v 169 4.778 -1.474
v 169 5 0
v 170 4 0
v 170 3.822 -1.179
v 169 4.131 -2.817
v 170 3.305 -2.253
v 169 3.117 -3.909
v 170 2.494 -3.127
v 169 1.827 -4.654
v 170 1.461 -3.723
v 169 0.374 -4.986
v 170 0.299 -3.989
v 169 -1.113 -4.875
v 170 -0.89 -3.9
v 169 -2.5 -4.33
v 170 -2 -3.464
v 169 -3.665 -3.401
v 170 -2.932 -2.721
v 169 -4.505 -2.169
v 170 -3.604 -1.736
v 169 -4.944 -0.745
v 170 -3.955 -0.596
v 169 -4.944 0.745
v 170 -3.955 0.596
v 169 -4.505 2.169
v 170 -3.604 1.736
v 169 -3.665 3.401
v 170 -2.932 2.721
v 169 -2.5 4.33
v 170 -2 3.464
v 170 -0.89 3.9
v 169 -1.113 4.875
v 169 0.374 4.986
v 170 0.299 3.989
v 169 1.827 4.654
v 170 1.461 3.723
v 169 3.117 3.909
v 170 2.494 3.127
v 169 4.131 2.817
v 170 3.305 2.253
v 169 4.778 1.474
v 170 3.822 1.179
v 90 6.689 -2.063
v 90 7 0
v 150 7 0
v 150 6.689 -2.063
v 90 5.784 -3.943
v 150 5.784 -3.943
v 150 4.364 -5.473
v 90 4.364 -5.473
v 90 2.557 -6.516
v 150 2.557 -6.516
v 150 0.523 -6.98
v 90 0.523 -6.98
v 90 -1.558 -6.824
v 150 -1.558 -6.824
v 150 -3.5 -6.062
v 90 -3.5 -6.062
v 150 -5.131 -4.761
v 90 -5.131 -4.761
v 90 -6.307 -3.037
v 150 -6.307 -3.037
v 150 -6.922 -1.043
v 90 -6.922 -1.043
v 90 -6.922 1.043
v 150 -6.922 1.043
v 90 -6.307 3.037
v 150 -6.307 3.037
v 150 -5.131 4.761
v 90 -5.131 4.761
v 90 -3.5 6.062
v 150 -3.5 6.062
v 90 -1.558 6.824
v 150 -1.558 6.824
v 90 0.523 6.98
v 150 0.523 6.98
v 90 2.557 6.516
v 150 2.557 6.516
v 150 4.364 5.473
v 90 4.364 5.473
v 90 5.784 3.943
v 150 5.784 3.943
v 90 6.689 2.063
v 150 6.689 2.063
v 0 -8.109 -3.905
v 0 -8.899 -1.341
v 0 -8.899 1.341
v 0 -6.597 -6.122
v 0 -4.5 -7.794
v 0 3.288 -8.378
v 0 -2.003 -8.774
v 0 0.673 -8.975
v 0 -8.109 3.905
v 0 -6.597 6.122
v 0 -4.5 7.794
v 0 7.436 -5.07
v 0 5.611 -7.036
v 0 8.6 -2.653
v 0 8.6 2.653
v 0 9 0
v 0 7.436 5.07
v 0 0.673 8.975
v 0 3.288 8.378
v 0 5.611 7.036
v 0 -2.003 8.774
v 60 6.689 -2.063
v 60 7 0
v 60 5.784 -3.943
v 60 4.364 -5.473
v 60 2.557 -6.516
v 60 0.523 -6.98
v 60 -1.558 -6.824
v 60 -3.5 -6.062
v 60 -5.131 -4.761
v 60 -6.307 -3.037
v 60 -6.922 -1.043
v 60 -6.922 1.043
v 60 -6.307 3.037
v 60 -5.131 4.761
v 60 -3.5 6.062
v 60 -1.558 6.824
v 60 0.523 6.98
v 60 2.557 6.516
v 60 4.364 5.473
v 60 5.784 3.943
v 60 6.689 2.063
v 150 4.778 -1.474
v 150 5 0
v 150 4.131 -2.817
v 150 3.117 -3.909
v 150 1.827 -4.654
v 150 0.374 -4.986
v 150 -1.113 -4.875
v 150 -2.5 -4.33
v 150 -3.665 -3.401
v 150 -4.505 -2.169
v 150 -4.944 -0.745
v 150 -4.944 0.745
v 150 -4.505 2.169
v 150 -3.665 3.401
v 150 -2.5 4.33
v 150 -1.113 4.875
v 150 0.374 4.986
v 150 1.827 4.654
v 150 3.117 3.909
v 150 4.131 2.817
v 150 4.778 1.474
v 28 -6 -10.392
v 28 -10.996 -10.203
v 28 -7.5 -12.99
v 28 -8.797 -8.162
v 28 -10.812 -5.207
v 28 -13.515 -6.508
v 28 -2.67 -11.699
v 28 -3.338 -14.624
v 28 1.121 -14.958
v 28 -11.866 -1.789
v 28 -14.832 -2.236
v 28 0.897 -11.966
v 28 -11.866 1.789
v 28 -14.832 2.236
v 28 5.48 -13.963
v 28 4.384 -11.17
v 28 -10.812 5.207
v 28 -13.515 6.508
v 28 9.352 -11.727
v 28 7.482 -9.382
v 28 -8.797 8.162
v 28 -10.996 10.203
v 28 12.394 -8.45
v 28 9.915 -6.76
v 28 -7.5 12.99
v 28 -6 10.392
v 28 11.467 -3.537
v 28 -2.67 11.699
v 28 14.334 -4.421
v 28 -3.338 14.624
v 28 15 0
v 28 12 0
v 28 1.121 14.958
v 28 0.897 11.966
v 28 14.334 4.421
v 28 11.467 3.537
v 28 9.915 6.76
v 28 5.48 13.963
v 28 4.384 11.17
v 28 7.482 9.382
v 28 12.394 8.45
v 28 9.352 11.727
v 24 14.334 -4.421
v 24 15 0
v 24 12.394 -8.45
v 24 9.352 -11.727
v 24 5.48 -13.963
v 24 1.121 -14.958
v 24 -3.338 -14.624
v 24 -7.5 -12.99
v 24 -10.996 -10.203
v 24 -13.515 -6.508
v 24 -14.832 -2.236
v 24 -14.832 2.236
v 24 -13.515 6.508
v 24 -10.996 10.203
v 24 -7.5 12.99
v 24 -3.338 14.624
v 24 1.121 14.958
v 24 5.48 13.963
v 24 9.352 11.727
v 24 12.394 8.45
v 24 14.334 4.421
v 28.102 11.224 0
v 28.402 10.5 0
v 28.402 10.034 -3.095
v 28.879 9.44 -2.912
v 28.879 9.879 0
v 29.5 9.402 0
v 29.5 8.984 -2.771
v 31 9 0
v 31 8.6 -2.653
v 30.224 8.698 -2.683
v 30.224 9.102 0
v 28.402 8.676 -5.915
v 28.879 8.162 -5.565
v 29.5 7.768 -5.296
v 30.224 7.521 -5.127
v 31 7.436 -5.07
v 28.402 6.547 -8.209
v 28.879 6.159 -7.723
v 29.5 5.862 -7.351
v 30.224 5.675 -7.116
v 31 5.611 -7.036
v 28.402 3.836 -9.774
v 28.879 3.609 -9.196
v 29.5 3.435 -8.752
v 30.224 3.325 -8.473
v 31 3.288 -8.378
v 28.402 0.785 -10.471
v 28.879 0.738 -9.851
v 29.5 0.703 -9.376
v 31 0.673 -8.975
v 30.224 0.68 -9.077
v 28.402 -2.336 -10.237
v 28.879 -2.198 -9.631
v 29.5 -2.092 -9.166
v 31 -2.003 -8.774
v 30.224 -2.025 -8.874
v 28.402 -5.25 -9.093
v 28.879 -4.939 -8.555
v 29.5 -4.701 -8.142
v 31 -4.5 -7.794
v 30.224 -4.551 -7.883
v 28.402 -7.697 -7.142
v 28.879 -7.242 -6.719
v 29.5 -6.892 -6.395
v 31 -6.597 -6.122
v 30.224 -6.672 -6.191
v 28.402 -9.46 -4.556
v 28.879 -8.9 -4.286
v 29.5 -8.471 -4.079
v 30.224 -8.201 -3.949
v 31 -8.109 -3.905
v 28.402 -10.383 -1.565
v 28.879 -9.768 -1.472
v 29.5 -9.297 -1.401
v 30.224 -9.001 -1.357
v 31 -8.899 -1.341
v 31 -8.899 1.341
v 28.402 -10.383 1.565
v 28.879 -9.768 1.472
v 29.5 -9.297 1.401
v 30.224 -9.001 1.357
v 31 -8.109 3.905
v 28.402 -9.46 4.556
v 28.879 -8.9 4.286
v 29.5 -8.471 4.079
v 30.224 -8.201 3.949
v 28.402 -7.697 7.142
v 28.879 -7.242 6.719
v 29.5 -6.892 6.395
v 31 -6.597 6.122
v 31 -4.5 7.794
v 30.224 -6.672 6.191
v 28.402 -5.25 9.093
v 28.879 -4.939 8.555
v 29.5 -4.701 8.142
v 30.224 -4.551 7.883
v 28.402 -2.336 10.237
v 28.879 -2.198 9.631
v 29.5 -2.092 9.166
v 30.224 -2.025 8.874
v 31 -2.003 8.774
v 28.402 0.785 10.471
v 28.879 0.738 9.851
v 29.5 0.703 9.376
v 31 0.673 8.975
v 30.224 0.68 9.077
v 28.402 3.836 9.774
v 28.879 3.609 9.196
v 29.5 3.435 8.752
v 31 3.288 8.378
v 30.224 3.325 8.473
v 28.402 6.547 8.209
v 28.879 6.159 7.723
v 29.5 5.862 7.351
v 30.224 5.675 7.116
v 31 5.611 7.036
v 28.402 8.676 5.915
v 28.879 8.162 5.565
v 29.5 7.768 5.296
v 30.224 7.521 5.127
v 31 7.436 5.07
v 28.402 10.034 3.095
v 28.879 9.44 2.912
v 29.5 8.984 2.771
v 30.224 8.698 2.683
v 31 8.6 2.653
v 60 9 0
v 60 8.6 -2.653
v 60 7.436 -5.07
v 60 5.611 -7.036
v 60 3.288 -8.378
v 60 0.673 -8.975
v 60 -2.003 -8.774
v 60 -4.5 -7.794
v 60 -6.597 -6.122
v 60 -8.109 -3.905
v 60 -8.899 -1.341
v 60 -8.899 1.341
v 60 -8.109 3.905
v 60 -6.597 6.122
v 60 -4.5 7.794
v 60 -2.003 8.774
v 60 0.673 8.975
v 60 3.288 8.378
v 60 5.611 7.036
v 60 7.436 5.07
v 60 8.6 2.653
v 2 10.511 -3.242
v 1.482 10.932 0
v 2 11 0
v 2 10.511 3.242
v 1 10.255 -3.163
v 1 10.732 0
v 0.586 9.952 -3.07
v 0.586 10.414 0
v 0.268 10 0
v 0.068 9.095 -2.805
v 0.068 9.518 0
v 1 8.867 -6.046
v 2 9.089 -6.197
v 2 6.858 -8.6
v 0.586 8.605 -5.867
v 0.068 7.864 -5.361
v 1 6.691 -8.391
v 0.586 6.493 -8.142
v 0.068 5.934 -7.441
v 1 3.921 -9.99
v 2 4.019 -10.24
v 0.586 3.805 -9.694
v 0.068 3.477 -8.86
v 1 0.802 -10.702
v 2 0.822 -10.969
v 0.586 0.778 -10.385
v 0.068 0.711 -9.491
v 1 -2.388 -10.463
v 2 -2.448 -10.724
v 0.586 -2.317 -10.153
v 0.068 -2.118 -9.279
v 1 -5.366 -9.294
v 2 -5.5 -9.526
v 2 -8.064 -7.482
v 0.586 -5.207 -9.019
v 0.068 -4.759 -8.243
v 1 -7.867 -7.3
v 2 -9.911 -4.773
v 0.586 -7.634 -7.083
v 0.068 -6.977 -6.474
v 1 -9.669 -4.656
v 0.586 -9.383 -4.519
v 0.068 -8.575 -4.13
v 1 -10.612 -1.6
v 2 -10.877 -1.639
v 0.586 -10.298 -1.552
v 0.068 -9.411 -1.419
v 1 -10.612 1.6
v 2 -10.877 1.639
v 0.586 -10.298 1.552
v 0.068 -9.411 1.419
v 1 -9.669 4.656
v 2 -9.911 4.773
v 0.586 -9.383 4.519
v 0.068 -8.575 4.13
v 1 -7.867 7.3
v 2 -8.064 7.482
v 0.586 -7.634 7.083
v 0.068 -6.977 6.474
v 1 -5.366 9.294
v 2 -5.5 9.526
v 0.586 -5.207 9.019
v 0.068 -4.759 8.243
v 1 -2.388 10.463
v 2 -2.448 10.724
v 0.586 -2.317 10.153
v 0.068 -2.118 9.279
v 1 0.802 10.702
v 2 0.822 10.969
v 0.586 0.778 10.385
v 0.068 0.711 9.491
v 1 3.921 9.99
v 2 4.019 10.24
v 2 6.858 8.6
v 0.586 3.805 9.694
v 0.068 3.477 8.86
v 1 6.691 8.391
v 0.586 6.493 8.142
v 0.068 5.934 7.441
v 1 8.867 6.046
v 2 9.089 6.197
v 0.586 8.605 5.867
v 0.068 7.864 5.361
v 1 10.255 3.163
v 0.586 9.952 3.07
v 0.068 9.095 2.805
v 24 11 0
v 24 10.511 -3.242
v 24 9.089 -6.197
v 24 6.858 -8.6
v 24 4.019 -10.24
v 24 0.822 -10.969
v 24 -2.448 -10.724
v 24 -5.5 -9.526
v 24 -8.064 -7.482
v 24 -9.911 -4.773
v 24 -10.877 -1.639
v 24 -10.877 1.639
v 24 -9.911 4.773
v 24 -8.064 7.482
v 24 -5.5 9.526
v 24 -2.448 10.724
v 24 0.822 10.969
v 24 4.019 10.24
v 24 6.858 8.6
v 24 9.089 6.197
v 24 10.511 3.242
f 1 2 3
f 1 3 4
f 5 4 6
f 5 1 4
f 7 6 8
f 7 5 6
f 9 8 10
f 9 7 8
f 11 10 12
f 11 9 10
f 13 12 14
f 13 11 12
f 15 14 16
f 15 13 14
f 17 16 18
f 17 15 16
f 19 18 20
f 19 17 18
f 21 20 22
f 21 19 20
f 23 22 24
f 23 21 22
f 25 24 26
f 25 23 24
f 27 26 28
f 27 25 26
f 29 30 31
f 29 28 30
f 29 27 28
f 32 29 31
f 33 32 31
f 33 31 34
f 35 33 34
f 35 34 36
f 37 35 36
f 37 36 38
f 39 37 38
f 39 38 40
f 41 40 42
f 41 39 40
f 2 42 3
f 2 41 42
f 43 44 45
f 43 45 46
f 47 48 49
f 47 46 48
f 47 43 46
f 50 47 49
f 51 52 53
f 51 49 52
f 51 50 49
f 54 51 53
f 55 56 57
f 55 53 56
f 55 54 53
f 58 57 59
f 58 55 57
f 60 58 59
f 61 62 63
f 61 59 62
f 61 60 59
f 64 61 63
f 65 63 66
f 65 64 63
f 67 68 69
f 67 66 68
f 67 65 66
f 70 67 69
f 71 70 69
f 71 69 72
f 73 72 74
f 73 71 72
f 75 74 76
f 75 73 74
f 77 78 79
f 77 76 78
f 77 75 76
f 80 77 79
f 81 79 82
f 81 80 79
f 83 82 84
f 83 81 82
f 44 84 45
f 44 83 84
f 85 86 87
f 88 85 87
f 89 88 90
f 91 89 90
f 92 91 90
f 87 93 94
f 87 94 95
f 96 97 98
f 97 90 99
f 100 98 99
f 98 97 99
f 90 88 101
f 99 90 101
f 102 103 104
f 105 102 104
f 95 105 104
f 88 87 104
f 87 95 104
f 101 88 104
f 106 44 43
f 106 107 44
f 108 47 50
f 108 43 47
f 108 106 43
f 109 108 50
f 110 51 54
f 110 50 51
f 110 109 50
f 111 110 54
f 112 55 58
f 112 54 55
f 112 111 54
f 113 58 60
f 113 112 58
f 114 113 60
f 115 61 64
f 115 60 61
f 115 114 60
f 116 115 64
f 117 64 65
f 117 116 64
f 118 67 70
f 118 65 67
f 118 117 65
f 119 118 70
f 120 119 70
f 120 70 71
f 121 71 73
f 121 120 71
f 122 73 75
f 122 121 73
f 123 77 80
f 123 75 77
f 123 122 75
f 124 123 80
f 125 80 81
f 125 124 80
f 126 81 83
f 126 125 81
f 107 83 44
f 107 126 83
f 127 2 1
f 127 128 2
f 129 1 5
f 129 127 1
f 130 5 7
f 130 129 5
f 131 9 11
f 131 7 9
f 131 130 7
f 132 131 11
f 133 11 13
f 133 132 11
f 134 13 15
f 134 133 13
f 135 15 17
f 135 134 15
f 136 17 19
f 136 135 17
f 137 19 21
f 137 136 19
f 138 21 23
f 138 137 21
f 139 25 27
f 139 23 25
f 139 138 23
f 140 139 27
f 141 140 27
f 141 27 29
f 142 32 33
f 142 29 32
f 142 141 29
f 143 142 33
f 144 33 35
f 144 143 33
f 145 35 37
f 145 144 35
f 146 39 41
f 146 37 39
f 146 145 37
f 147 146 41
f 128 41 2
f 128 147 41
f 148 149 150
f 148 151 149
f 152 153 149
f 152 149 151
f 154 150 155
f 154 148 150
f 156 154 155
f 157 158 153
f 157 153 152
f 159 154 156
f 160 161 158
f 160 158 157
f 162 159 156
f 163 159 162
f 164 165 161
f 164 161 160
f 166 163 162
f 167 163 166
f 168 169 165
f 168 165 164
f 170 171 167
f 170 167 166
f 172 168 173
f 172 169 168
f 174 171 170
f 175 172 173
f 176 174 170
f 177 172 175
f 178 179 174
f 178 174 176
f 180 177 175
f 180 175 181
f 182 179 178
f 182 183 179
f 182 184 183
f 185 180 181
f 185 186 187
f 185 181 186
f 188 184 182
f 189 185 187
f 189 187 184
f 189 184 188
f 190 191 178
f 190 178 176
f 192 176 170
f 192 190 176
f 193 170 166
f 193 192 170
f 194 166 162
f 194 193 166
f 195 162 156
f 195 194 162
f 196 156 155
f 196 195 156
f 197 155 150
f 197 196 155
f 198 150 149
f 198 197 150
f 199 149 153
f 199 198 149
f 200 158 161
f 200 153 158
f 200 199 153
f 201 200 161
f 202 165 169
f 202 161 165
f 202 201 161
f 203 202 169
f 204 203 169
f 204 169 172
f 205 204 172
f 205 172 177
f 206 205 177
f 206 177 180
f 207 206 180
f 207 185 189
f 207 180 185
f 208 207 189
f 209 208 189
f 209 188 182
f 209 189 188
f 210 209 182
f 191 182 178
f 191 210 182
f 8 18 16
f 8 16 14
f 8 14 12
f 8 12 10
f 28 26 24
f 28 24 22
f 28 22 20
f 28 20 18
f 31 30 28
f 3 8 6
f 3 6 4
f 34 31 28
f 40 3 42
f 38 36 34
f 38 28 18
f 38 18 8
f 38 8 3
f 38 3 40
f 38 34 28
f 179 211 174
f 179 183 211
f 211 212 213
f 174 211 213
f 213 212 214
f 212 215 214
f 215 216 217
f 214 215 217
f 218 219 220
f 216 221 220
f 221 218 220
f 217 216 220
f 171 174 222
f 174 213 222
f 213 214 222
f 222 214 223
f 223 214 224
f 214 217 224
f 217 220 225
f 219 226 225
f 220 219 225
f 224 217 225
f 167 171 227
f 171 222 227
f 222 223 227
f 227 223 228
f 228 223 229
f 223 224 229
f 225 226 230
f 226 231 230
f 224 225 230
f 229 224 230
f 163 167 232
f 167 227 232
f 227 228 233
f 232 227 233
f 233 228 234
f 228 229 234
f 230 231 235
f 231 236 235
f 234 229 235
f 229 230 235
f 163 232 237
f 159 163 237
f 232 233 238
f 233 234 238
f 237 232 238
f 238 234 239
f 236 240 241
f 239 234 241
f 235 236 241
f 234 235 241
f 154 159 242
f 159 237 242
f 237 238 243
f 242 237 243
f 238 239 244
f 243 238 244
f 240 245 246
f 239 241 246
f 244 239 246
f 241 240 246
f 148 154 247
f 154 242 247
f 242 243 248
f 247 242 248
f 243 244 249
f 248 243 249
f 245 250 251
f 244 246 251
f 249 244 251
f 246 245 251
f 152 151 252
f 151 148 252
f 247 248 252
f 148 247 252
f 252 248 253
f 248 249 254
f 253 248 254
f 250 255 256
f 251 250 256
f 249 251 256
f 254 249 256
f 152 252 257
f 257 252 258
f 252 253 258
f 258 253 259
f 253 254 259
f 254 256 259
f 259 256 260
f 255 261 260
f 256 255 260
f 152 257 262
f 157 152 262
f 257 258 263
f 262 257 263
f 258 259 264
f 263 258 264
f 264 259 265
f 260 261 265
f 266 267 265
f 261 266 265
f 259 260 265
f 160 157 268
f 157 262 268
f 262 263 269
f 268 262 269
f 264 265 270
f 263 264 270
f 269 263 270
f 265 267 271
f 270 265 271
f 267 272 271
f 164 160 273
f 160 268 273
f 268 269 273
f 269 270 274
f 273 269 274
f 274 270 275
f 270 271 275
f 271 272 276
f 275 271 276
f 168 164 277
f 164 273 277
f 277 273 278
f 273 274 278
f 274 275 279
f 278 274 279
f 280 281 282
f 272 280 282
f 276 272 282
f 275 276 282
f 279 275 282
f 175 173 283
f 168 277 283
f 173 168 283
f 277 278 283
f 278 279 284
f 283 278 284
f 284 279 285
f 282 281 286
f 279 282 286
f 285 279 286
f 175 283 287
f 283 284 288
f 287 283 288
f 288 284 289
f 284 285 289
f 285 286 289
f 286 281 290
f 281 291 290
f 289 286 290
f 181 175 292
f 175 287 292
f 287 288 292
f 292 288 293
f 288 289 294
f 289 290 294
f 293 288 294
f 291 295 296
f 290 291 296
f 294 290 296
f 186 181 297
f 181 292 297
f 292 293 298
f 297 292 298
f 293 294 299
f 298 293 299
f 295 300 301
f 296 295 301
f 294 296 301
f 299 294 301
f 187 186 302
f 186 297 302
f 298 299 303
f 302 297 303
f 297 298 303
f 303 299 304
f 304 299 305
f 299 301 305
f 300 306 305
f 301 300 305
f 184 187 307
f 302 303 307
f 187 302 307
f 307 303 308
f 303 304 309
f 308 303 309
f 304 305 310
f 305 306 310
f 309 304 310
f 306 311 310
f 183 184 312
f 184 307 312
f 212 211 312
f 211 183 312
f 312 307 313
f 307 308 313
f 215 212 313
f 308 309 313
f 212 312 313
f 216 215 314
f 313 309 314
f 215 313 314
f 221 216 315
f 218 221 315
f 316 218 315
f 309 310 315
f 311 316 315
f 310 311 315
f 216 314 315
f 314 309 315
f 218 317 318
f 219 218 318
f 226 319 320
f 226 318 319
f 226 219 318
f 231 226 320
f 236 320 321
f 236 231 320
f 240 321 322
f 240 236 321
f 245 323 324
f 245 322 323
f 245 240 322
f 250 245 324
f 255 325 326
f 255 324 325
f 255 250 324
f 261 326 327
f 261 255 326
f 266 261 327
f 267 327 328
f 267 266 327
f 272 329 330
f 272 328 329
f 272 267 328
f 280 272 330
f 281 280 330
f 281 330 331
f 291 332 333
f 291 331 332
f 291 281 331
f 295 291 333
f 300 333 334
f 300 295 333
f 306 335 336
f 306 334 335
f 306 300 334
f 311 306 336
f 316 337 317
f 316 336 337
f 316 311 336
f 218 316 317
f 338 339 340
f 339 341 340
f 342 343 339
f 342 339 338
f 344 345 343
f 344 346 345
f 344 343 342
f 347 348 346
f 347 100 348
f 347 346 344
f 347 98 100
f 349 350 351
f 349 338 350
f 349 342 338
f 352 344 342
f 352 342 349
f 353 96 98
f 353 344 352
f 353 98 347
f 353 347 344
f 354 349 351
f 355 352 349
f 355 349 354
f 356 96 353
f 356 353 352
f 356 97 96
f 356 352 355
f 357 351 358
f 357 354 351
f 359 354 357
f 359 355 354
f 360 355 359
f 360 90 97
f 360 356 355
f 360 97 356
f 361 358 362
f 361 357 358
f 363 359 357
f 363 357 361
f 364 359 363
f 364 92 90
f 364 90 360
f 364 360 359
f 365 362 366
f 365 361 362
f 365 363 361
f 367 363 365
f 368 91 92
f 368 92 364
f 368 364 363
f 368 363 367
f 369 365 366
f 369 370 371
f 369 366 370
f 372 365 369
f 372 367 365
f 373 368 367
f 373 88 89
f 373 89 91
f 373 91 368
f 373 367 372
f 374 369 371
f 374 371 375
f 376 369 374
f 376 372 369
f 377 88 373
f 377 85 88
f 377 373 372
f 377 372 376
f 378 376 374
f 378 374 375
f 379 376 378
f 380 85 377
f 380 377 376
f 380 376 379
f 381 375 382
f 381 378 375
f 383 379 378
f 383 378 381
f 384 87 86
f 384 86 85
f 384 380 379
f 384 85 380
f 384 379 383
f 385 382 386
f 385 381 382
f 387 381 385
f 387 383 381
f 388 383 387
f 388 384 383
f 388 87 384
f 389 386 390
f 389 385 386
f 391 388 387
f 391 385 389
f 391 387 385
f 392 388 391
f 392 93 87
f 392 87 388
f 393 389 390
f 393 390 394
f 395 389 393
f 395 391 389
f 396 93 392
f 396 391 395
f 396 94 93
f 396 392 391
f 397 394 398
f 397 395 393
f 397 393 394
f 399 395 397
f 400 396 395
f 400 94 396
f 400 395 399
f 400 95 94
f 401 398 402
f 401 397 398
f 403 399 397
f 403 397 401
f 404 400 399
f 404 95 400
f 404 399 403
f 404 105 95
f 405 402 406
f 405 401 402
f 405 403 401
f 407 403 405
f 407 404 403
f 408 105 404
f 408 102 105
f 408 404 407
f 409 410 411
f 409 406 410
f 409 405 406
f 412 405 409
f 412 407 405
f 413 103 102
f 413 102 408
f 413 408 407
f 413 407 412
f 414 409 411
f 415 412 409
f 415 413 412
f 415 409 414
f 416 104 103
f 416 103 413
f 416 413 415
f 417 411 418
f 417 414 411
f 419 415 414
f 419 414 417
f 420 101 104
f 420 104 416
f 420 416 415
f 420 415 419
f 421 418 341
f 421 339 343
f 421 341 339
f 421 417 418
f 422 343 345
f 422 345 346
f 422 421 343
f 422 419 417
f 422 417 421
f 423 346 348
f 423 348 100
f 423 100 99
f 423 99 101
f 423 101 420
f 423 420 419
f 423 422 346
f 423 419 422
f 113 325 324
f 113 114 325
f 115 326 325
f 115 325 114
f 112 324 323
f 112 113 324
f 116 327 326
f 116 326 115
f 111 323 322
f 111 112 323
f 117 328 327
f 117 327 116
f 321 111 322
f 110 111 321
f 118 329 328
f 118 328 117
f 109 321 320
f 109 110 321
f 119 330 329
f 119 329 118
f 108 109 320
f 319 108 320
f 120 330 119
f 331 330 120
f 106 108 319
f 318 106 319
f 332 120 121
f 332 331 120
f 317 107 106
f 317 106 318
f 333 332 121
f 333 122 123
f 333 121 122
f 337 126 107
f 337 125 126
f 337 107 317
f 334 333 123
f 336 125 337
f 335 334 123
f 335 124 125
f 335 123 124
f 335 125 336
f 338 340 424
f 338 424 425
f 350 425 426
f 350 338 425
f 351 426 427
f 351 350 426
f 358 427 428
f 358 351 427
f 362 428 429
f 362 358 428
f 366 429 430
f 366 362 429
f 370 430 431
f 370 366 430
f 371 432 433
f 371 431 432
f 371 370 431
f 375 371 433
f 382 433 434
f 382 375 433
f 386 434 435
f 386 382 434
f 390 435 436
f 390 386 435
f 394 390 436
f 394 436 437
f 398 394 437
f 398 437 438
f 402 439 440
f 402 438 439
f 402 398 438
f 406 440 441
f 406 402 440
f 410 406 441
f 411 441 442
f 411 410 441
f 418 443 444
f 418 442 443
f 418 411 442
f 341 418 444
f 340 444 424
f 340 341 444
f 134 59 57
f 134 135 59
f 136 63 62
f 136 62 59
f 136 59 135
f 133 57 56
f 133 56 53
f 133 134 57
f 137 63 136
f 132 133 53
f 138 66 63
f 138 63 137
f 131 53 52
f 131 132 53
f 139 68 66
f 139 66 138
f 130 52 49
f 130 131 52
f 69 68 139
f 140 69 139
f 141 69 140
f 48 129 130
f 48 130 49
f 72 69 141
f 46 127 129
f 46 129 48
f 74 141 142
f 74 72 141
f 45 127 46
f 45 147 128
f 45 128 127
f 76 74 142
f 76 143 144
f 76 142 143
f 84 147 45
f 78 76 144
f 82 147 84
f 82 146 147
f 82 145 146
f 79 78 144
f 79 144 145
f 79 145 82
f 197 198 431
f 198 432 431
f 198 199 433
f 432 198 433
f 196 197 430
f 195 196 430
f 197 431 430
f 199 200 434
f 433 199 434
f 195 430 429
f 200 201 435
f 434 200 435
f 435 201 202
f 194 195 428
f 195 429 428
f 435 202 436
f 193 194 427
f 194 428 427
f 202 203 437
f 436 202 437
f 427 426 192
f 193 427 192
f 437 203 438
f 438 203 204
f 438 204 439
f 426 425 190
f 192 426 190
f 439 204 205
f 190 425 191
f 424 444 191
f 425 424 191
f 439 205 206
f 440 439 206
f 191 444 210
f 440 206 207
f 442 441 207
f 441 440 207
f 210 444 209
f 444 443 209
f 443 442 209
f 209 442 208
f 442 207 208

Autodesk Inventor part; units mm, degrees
ref_plane "YZ Plane" through (0, 0, 0) normal (1, 0, 0) x (0, 1, 0)
ref_plane "XZ Plane" through (0, 0, 0) normal (0, 1, 0) x (-1, 0, 0)
ref_plane "XY Plane" through (0, 0, 0) normal (0, 0, 1) x (1, 0, 0)
sketch "Sketch1" plane through (0, 0, 0) normal (0, 0, 1) x (1, 0, 0)
  line L0 (0, 0) -> (170, 0)
  line L1 (170, 0) -> (170, 5)
  line L2 (170, 5) -> (150, 5)
  line L3 (150, 5) -> (150, 7)
  line L4 (150, 7) -> (90, 7)
  line L5 (90, 7) -> (60, 7)
  line L6 (60, 7) -> (60, 9)
  line L7 (60, 9) -> (28, 9)
  line L8 (28, 9) -> (28, 15)
  line L9 (28, 15) -> (24, 15)
  line L10 (24, 15) -> (24, 11)
  line L11 (24, 11) -> (0, 11)
  line L12 (0, 11) -> (0, 0)
  dimension "d0" = 170
  dimension "d1" = 10
  dimension "d2" = 14
  dimension "d3" = 18
  dimension "d4" = 30
  dimension "d5" = 22
  dimension "d6" = 24
  dimension "d7" = 4
  dimension "d8" = 32
  dimension "d9" = 60
  dimension "d10" = 30
revolve "Revolution1" add sketch "Sketch1" angle 360 about axis through (0, 0, 0) along (1, 0, 0)
thread "Thread1" size "M14x2" class "6g" standard "ANSI Metric M Profile" length 60
fillet "Fillet1" radius 3 1 edges at (28, -9, 0)
fillet "Fillet2" radius 2 1 edges at (0, -11, 0)
chamfer "Chamfer1" distance 1 angle 45 1 edges at (170, -5, 0)
